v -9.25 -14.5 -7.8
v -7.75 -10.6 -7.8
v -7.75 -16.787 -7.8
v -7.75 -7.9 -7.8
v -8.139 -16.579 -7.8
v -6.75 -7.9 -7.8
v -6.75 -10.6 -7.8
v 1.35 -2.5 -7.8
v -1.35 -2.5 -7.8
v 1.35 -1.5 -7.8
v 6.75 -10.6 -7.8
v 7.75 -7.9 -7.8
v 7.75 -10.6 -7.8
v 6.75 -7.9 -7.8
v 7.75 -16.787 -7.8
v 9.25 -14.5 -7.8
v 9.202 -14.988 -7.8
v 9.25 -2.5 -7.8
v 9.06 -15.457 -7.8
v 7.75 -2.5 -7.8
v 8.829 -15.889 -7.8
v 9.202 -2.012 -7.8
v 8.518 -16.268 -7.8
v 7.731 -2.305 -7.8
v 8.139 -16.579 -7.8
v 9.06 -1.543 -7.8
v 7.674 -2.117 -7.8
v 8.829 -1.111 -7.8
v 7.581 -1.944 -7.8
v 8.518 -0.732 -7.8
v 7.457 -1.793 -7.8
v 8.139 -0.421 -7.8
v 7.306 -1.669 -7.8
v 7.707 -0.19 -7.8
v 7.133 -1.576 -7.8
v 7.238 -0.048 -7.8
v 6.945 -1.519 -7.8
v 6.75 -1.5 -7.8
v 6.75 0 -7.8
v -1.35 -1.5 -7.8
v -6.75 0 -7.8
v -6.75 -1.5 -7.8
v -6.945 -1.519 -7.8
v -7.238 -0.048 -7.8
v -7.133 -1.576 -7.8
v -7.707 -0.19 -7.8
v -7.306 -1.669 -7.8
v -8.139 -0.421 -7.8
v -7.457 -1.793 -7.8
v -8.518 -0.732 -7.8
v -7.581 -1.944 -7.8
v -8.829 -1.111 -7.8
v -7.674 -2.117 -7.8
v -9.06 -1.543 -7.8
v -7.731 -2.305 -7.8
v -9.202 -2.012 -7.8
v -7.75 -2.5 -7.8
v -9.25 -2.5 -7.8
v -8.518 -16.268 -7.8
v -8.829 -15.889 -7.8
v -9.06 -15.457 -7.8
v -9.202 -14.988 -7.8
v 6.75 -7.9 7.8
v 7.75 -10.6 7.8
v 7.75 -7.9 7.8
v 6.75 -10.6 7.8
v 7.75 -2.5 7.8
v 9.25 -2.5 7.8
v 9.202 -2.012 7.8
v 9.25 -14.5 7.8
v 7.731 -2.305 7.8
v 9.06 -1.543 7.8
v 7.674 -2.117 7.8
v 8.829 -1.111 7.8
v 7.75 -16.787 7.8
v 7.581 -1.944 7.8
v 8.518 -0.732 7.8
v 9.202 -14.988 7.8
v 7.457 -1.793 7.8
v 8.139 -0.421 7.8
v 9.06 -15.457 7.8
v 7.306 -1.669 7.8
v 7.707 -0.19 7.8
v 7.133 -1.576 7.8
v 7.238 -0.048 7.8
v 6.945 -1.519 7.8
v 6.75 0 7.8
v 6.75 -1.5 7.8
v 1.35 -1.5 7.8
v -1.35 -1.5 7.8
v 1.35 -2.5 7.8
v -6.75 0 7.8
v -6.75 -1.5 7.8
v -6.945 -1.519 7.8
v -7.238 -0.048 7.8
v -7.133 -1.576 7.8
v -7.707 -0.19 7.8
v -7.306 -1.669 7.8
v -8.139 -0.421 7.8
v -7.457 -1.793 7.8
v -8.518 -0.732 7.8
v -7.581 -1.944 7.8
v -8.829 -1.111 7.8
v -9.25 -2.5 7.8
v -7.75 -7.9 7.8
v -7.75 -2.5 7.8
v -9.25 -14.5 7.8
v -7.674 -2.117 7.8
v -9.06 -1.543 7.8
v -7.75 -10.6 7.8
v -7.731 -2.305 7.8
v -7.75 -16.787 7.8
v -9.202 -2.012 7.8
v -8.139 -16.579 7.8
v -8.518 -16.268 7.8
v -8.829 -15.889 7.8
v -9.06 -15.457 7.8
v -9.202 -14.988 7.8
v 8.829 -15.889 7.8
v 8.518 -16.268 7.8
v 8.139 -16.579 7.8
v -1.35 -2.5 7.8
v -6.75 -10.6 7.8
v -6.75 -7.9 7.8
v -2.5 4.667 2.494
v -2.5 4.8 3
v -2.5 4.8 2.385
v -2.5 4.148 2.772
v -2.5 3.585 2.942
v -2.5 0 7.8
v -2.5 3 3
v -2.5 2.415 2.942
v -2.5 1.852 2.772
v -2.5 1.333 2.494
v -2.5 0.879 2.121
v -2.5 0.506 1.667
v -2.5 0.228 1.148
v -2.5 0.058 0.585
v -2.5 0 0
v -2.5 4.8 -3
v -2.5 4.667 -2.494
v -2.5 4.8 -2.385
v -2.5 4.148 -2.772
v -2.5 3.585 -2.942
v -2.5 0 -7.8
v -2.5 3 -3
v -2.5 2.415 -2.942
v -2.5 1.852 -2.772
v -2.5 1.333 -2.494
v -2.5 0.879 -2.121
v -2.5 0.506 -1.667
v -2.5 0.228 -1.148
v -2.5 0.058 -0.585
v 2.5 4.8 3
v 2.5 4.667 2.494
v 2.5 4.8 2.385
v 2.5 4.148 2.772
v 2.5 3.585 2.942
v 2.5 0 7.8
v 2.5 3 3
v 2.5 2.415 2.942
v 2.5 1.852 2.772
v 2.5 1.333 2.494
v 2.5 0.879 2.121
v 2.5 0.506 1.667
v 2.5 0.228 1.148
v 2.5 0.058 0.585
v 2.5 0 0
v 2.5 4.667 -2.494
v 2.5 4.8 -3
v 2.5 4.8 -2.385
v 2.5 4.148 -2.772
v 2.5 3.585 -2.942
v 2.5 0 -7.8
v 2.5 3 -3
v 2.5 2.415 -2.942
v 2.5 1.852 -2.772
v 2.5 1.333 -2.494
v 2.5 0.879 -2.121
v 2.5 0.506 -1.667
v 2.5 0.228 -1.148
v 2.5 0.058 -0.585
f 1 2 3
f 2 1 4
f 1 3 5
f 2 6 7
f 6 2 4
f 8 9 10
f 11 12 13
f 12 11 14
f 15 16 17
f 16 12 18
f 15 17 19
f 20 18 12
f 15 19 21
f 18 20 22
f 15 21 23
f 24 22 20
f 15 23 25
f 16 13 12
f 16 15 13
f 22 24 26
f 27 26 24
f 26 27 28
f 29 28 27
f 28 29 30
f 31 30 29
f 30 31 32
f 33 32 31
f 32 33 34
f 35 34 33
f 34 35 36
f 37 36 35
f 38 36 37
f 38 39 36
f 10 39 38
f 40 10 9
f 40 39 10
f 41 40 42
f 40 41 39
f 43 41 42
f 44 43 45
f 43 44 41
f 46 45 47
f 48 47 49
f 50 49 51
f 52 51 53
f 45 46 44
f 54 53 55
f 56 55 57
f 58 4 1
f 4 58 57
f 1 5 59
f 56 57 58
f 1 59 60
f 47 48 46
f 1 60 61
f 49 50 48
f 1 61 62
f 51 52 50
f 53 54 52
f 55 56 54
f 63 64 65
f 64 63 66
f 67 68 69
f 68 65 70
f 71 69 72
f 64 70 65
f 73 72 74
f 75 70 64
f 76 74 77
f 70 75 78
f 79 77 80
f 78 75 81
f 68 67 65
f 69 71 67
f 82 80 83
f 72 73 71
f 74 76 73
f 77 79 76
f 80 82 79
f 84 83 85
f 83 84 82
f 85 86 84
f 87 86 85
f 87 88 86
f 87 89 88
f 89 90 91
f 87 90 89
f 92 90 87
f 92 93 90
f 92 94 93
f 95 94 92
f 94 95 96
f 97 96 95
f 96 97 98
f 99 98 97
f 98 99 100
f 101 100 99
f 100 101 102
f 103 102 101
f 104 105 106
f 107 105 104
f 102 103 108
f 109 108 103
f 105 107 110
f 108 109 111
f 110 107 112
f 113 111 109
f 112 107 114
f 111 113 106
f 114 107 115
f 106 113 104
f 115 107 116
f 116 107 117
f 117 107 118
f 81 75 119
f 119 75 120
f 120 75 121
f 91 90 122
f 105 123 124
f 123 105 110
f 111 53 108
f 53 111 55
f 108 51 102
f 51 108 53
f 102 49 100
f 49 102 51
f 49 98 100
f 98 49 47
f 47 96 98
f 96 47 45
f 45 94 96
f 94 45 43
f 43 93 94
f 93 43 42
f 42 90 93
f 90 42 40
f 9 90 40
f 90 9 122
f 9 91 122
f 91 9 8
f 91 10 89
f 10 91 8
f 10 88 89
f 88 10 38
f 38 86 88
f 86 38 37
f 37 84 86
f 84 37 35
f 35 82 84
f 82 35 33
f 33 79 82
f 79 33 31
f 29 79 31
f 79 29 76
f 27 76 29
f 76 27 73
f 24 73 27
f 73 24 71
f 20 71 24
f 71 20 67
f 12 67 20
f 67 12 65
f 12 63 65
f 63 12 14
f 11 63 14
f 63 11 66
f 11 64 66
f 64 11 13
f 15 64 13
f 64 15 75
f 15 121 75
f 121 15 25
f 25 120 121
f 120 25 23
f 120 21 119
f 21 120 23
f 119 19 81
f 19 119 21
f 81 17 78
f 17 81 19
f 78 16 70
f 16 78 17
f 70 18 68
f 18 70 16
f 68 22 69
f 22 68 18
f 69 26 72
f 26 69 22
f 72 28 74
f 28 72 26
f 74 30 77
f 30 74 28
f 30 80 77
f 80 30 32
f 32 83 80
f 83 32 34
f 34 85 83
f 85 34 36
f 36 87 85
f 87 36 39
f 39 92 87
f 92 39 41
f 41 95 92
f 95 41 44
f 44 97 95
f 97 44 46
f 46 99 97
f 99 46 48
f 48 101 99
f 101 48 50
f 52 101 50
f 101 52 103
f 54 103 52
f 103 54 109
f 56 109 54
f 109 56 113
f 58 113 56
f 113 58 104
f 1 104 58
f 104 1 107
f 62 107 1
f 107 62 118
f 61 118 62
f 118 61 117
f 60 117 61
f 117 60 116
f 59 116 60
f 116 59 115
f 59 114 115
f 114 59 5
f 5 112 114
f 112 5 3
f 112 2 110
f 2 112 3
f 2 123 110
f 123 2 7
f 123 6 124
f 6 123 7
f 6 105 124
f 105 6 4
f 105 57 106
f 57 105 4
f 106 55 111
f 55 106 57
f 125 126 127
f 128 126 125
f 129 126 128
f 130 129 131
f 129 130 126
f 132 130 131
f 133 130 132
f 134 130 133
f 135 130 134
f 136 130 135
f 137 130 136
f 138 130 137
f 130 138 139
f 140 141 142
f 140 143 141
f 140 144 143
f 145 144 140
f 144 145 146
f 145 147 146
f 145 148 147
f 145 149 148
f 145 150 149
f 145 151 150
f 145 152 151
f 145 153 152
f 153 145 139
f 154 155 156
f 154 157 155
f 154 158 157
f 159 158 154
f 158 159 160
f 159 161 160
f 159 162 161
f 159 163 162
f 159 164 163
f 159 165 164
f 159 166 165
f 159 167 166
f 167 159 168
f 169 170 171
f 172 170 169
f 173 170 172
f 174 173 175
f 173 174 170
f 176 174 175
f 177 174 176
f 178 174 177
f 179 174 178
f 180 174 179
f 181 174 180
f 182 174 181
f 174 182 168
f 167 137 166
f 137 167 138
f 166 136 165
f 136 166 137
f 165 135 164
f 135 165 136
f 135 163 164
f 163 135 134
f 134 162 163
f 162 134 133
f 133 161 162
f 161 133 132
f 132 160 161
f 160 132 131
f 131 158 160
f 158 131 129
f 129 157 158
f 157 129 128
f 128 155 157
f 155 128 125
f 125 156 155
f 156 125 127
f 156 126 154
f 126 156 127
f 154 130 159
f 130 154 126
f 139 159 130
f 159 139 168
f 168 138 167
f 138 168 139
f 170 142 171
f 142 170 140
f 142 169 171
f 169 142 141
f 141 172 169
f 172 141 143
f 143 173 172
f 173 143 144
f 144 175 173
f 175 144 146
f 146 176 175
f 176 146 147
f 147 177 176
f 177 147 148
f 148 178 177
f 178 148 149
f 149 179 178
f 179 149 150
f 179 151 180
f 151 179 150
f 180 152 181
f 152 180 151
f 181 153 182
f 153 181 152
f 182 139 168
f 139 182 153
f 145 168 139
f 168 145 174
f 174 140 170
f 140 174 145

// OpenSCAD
// file: isosceles_trapezoid.scad
module isosceles_trapezoid(d = 5, angle = 45, h = 1, height = 1) {
	bevel_width = h/tan(angle);
	base_width = d + 2*bevel_width;
	scale_x = base_width/d;

	// turn back into 2D primitive
	projection()
		// turn flat on x plane
		rotate([90, 0, 0])
			// move back into center
			translate([0, 0, -h/2])
				// extrude with scaling into trapezoid
				linear_extrude(height = h, scale=[scale_x, 1])
					square([d, 1], center = true);
}

isosceles_trapezoid();
// file: tube_holder.scad
$fn = 32;

use <isosceles_trapezoid.scad>;

function tube_holder_outer_length(tube_diameter) = tube_diameter;

// derive bevel width from thickness so that actual bevel thickness equals
// thickness
function tube_holder_outer_height(tube_diameter, clip_factor) =
	tube_diameter/2 * (1 + clip_factor);

// allow users to query the base width of the holder so they know what room
// they must make for attaching it somewhere
function tube_holder_base_length(tube_diameter, angle, clip_factor) =
	let(bevel_width = tube_holder_outer_height(tube_diameter, clip_factor) / tan(angle))
	tube_holder_outer_length(tube_diameter) + 2*bevel_width;

module tube_holder(holder_width = 5, tube_diameter = 6, clip_factor = 0.3,
		thickness = 1.5, angle = 45) {
	outer_height = tube_holder_outer_height(tube_diameter, clip_factor);

	// move to a zero line in y direction and otherwise in center
	// so we can put it on top of other stuff
	translate([0, tube_diameter/2, -holder_width/2])
		linear_extrude(holder_width)
			difference() {
				// beveled for more technical look and better
				// overhang printing
				translate([0, -tube_diameter/2 + outer_height/2, 0])
					isosceles_trapezoid(d = tube_holder_outer_length(tube_diameter),
						h = outer_height, angle = angle);
				circle(d = tube_diameter);
			}
}

tube_holder();
// file: openbeam_clip.scad
$fn = 32;

module rounded_rectangle(width = 1, height = 1, rounding = 0) {
	if (rounding > 0) {
		non_rounded_width = width - 2*rounding;
		non_rounded_height = height - 2*rounding;

		// correct for funky minkowski displacement
		translate([-non_rounded_width/2, -non_rounded_height/2])
			minkowski() {
				square([non_rounded_width, non_rounded_height], center = true);
				translate([non_rounded_width/2, non_rounded_height/2, 0])
					circle(rounding, center = true);
			}
	} else {
		// minkowski doesn't work properly on circle with diameter 0
		square([width, height], center = true);
	}
}

function openbeam_clip_outer_width(beam_width, thickness) =
	beam_width + 2*thickness;

module openbeam_clip_cross(beam_width, rounding, thickness) {
	difference() {
		outer_width = openbeam_clip_outer_width(beam_width = beam_width,
			thickness = thickness);

		// since clip is open at the bottom, remove one thickness and
		// move down by half of that to be back in center
		translate([0, thickness/2, 0])
			rounded_rectangle(width = outer_width,
				height = outer_width - thickness,
				rounding = rounding + thickness);

		// make inner rectangle higher than outer by one thickness
		// (to be on the safe side) and shift down by
		// half of that to be centered with the outer again
		translate([0, -thickness/2, 0])
			rounded_rectangle(width = beam_width,
				height = beam_width + thickness,
				rounding = rounding);
	}
}

module openbeam_clip_stay(slot_width = 3.2, protrusion = 0.75) {
	square([slot_width, protrusion], center = true);
}

module openbeam_clip(beam_width = 15, height = 15,
		beam_slot_width = 3.2, stay_protrusion = 1,
		rounding = 1, thickness = 1.5,
		epsilon = 0.25) {
	cbw = beam_width + 2*epsilon;
	outer_width = openbeam_clip_outer_width(beam_width = cbw, thickness = thickness);

	// move back into center after extrude but put top onto y as base-line
	// for attaching things to it
	translate([0, -outer_width/2, -height/2])
		linear_extrude(height)
			union() {
				openbeam_clip_cross(beam_width = cbw,
					rounding = rounding,
					thickness = thickness);

				// add in the stays
				stay_position = cbw/2 - stay_protrusion/2;
				cbsw = beam_slot_width - 2*epsilon;
				for (stay_angle =[-90:90:90])
					rotate([0, 0, stay_angle])
						translate([0, stay_position, 0])
						openbeam_clip_stay(slot_width = cbsw,
							protrusion = stay_protrusion);
			}
}

openbeam_clip();
// main file
$fn = 32;
use <openbeam_clip.scad>;
use <tube_holder.scad>;

module openbeam_tube_clip(beam_width = 15, height = 5,
		tube_diameter = 6, clip_factor = 0.6,
		tube_holder_angle = 45,
		thickness = 1.5, epsilon = 0.25) {
	union() {
		openbeam_clip(beam_width = beam_width,
			height = tube_holder_base_length(
				tube_diameter = tube_diameter,
				angle = tube_holder_angle,
				clip_factor = clip_factor),
			thickness = thickness,
			epsilon = 0.25);

		rotate([0, 90, 0])
			tube_holder(tube_diameter = tube_diameter,
				clip_factor = clip_factor,
				holder_width = height,
				angle = tube_holder_angle,
				thickness = thickness);
	}
}

openbeam_tube_clip();
